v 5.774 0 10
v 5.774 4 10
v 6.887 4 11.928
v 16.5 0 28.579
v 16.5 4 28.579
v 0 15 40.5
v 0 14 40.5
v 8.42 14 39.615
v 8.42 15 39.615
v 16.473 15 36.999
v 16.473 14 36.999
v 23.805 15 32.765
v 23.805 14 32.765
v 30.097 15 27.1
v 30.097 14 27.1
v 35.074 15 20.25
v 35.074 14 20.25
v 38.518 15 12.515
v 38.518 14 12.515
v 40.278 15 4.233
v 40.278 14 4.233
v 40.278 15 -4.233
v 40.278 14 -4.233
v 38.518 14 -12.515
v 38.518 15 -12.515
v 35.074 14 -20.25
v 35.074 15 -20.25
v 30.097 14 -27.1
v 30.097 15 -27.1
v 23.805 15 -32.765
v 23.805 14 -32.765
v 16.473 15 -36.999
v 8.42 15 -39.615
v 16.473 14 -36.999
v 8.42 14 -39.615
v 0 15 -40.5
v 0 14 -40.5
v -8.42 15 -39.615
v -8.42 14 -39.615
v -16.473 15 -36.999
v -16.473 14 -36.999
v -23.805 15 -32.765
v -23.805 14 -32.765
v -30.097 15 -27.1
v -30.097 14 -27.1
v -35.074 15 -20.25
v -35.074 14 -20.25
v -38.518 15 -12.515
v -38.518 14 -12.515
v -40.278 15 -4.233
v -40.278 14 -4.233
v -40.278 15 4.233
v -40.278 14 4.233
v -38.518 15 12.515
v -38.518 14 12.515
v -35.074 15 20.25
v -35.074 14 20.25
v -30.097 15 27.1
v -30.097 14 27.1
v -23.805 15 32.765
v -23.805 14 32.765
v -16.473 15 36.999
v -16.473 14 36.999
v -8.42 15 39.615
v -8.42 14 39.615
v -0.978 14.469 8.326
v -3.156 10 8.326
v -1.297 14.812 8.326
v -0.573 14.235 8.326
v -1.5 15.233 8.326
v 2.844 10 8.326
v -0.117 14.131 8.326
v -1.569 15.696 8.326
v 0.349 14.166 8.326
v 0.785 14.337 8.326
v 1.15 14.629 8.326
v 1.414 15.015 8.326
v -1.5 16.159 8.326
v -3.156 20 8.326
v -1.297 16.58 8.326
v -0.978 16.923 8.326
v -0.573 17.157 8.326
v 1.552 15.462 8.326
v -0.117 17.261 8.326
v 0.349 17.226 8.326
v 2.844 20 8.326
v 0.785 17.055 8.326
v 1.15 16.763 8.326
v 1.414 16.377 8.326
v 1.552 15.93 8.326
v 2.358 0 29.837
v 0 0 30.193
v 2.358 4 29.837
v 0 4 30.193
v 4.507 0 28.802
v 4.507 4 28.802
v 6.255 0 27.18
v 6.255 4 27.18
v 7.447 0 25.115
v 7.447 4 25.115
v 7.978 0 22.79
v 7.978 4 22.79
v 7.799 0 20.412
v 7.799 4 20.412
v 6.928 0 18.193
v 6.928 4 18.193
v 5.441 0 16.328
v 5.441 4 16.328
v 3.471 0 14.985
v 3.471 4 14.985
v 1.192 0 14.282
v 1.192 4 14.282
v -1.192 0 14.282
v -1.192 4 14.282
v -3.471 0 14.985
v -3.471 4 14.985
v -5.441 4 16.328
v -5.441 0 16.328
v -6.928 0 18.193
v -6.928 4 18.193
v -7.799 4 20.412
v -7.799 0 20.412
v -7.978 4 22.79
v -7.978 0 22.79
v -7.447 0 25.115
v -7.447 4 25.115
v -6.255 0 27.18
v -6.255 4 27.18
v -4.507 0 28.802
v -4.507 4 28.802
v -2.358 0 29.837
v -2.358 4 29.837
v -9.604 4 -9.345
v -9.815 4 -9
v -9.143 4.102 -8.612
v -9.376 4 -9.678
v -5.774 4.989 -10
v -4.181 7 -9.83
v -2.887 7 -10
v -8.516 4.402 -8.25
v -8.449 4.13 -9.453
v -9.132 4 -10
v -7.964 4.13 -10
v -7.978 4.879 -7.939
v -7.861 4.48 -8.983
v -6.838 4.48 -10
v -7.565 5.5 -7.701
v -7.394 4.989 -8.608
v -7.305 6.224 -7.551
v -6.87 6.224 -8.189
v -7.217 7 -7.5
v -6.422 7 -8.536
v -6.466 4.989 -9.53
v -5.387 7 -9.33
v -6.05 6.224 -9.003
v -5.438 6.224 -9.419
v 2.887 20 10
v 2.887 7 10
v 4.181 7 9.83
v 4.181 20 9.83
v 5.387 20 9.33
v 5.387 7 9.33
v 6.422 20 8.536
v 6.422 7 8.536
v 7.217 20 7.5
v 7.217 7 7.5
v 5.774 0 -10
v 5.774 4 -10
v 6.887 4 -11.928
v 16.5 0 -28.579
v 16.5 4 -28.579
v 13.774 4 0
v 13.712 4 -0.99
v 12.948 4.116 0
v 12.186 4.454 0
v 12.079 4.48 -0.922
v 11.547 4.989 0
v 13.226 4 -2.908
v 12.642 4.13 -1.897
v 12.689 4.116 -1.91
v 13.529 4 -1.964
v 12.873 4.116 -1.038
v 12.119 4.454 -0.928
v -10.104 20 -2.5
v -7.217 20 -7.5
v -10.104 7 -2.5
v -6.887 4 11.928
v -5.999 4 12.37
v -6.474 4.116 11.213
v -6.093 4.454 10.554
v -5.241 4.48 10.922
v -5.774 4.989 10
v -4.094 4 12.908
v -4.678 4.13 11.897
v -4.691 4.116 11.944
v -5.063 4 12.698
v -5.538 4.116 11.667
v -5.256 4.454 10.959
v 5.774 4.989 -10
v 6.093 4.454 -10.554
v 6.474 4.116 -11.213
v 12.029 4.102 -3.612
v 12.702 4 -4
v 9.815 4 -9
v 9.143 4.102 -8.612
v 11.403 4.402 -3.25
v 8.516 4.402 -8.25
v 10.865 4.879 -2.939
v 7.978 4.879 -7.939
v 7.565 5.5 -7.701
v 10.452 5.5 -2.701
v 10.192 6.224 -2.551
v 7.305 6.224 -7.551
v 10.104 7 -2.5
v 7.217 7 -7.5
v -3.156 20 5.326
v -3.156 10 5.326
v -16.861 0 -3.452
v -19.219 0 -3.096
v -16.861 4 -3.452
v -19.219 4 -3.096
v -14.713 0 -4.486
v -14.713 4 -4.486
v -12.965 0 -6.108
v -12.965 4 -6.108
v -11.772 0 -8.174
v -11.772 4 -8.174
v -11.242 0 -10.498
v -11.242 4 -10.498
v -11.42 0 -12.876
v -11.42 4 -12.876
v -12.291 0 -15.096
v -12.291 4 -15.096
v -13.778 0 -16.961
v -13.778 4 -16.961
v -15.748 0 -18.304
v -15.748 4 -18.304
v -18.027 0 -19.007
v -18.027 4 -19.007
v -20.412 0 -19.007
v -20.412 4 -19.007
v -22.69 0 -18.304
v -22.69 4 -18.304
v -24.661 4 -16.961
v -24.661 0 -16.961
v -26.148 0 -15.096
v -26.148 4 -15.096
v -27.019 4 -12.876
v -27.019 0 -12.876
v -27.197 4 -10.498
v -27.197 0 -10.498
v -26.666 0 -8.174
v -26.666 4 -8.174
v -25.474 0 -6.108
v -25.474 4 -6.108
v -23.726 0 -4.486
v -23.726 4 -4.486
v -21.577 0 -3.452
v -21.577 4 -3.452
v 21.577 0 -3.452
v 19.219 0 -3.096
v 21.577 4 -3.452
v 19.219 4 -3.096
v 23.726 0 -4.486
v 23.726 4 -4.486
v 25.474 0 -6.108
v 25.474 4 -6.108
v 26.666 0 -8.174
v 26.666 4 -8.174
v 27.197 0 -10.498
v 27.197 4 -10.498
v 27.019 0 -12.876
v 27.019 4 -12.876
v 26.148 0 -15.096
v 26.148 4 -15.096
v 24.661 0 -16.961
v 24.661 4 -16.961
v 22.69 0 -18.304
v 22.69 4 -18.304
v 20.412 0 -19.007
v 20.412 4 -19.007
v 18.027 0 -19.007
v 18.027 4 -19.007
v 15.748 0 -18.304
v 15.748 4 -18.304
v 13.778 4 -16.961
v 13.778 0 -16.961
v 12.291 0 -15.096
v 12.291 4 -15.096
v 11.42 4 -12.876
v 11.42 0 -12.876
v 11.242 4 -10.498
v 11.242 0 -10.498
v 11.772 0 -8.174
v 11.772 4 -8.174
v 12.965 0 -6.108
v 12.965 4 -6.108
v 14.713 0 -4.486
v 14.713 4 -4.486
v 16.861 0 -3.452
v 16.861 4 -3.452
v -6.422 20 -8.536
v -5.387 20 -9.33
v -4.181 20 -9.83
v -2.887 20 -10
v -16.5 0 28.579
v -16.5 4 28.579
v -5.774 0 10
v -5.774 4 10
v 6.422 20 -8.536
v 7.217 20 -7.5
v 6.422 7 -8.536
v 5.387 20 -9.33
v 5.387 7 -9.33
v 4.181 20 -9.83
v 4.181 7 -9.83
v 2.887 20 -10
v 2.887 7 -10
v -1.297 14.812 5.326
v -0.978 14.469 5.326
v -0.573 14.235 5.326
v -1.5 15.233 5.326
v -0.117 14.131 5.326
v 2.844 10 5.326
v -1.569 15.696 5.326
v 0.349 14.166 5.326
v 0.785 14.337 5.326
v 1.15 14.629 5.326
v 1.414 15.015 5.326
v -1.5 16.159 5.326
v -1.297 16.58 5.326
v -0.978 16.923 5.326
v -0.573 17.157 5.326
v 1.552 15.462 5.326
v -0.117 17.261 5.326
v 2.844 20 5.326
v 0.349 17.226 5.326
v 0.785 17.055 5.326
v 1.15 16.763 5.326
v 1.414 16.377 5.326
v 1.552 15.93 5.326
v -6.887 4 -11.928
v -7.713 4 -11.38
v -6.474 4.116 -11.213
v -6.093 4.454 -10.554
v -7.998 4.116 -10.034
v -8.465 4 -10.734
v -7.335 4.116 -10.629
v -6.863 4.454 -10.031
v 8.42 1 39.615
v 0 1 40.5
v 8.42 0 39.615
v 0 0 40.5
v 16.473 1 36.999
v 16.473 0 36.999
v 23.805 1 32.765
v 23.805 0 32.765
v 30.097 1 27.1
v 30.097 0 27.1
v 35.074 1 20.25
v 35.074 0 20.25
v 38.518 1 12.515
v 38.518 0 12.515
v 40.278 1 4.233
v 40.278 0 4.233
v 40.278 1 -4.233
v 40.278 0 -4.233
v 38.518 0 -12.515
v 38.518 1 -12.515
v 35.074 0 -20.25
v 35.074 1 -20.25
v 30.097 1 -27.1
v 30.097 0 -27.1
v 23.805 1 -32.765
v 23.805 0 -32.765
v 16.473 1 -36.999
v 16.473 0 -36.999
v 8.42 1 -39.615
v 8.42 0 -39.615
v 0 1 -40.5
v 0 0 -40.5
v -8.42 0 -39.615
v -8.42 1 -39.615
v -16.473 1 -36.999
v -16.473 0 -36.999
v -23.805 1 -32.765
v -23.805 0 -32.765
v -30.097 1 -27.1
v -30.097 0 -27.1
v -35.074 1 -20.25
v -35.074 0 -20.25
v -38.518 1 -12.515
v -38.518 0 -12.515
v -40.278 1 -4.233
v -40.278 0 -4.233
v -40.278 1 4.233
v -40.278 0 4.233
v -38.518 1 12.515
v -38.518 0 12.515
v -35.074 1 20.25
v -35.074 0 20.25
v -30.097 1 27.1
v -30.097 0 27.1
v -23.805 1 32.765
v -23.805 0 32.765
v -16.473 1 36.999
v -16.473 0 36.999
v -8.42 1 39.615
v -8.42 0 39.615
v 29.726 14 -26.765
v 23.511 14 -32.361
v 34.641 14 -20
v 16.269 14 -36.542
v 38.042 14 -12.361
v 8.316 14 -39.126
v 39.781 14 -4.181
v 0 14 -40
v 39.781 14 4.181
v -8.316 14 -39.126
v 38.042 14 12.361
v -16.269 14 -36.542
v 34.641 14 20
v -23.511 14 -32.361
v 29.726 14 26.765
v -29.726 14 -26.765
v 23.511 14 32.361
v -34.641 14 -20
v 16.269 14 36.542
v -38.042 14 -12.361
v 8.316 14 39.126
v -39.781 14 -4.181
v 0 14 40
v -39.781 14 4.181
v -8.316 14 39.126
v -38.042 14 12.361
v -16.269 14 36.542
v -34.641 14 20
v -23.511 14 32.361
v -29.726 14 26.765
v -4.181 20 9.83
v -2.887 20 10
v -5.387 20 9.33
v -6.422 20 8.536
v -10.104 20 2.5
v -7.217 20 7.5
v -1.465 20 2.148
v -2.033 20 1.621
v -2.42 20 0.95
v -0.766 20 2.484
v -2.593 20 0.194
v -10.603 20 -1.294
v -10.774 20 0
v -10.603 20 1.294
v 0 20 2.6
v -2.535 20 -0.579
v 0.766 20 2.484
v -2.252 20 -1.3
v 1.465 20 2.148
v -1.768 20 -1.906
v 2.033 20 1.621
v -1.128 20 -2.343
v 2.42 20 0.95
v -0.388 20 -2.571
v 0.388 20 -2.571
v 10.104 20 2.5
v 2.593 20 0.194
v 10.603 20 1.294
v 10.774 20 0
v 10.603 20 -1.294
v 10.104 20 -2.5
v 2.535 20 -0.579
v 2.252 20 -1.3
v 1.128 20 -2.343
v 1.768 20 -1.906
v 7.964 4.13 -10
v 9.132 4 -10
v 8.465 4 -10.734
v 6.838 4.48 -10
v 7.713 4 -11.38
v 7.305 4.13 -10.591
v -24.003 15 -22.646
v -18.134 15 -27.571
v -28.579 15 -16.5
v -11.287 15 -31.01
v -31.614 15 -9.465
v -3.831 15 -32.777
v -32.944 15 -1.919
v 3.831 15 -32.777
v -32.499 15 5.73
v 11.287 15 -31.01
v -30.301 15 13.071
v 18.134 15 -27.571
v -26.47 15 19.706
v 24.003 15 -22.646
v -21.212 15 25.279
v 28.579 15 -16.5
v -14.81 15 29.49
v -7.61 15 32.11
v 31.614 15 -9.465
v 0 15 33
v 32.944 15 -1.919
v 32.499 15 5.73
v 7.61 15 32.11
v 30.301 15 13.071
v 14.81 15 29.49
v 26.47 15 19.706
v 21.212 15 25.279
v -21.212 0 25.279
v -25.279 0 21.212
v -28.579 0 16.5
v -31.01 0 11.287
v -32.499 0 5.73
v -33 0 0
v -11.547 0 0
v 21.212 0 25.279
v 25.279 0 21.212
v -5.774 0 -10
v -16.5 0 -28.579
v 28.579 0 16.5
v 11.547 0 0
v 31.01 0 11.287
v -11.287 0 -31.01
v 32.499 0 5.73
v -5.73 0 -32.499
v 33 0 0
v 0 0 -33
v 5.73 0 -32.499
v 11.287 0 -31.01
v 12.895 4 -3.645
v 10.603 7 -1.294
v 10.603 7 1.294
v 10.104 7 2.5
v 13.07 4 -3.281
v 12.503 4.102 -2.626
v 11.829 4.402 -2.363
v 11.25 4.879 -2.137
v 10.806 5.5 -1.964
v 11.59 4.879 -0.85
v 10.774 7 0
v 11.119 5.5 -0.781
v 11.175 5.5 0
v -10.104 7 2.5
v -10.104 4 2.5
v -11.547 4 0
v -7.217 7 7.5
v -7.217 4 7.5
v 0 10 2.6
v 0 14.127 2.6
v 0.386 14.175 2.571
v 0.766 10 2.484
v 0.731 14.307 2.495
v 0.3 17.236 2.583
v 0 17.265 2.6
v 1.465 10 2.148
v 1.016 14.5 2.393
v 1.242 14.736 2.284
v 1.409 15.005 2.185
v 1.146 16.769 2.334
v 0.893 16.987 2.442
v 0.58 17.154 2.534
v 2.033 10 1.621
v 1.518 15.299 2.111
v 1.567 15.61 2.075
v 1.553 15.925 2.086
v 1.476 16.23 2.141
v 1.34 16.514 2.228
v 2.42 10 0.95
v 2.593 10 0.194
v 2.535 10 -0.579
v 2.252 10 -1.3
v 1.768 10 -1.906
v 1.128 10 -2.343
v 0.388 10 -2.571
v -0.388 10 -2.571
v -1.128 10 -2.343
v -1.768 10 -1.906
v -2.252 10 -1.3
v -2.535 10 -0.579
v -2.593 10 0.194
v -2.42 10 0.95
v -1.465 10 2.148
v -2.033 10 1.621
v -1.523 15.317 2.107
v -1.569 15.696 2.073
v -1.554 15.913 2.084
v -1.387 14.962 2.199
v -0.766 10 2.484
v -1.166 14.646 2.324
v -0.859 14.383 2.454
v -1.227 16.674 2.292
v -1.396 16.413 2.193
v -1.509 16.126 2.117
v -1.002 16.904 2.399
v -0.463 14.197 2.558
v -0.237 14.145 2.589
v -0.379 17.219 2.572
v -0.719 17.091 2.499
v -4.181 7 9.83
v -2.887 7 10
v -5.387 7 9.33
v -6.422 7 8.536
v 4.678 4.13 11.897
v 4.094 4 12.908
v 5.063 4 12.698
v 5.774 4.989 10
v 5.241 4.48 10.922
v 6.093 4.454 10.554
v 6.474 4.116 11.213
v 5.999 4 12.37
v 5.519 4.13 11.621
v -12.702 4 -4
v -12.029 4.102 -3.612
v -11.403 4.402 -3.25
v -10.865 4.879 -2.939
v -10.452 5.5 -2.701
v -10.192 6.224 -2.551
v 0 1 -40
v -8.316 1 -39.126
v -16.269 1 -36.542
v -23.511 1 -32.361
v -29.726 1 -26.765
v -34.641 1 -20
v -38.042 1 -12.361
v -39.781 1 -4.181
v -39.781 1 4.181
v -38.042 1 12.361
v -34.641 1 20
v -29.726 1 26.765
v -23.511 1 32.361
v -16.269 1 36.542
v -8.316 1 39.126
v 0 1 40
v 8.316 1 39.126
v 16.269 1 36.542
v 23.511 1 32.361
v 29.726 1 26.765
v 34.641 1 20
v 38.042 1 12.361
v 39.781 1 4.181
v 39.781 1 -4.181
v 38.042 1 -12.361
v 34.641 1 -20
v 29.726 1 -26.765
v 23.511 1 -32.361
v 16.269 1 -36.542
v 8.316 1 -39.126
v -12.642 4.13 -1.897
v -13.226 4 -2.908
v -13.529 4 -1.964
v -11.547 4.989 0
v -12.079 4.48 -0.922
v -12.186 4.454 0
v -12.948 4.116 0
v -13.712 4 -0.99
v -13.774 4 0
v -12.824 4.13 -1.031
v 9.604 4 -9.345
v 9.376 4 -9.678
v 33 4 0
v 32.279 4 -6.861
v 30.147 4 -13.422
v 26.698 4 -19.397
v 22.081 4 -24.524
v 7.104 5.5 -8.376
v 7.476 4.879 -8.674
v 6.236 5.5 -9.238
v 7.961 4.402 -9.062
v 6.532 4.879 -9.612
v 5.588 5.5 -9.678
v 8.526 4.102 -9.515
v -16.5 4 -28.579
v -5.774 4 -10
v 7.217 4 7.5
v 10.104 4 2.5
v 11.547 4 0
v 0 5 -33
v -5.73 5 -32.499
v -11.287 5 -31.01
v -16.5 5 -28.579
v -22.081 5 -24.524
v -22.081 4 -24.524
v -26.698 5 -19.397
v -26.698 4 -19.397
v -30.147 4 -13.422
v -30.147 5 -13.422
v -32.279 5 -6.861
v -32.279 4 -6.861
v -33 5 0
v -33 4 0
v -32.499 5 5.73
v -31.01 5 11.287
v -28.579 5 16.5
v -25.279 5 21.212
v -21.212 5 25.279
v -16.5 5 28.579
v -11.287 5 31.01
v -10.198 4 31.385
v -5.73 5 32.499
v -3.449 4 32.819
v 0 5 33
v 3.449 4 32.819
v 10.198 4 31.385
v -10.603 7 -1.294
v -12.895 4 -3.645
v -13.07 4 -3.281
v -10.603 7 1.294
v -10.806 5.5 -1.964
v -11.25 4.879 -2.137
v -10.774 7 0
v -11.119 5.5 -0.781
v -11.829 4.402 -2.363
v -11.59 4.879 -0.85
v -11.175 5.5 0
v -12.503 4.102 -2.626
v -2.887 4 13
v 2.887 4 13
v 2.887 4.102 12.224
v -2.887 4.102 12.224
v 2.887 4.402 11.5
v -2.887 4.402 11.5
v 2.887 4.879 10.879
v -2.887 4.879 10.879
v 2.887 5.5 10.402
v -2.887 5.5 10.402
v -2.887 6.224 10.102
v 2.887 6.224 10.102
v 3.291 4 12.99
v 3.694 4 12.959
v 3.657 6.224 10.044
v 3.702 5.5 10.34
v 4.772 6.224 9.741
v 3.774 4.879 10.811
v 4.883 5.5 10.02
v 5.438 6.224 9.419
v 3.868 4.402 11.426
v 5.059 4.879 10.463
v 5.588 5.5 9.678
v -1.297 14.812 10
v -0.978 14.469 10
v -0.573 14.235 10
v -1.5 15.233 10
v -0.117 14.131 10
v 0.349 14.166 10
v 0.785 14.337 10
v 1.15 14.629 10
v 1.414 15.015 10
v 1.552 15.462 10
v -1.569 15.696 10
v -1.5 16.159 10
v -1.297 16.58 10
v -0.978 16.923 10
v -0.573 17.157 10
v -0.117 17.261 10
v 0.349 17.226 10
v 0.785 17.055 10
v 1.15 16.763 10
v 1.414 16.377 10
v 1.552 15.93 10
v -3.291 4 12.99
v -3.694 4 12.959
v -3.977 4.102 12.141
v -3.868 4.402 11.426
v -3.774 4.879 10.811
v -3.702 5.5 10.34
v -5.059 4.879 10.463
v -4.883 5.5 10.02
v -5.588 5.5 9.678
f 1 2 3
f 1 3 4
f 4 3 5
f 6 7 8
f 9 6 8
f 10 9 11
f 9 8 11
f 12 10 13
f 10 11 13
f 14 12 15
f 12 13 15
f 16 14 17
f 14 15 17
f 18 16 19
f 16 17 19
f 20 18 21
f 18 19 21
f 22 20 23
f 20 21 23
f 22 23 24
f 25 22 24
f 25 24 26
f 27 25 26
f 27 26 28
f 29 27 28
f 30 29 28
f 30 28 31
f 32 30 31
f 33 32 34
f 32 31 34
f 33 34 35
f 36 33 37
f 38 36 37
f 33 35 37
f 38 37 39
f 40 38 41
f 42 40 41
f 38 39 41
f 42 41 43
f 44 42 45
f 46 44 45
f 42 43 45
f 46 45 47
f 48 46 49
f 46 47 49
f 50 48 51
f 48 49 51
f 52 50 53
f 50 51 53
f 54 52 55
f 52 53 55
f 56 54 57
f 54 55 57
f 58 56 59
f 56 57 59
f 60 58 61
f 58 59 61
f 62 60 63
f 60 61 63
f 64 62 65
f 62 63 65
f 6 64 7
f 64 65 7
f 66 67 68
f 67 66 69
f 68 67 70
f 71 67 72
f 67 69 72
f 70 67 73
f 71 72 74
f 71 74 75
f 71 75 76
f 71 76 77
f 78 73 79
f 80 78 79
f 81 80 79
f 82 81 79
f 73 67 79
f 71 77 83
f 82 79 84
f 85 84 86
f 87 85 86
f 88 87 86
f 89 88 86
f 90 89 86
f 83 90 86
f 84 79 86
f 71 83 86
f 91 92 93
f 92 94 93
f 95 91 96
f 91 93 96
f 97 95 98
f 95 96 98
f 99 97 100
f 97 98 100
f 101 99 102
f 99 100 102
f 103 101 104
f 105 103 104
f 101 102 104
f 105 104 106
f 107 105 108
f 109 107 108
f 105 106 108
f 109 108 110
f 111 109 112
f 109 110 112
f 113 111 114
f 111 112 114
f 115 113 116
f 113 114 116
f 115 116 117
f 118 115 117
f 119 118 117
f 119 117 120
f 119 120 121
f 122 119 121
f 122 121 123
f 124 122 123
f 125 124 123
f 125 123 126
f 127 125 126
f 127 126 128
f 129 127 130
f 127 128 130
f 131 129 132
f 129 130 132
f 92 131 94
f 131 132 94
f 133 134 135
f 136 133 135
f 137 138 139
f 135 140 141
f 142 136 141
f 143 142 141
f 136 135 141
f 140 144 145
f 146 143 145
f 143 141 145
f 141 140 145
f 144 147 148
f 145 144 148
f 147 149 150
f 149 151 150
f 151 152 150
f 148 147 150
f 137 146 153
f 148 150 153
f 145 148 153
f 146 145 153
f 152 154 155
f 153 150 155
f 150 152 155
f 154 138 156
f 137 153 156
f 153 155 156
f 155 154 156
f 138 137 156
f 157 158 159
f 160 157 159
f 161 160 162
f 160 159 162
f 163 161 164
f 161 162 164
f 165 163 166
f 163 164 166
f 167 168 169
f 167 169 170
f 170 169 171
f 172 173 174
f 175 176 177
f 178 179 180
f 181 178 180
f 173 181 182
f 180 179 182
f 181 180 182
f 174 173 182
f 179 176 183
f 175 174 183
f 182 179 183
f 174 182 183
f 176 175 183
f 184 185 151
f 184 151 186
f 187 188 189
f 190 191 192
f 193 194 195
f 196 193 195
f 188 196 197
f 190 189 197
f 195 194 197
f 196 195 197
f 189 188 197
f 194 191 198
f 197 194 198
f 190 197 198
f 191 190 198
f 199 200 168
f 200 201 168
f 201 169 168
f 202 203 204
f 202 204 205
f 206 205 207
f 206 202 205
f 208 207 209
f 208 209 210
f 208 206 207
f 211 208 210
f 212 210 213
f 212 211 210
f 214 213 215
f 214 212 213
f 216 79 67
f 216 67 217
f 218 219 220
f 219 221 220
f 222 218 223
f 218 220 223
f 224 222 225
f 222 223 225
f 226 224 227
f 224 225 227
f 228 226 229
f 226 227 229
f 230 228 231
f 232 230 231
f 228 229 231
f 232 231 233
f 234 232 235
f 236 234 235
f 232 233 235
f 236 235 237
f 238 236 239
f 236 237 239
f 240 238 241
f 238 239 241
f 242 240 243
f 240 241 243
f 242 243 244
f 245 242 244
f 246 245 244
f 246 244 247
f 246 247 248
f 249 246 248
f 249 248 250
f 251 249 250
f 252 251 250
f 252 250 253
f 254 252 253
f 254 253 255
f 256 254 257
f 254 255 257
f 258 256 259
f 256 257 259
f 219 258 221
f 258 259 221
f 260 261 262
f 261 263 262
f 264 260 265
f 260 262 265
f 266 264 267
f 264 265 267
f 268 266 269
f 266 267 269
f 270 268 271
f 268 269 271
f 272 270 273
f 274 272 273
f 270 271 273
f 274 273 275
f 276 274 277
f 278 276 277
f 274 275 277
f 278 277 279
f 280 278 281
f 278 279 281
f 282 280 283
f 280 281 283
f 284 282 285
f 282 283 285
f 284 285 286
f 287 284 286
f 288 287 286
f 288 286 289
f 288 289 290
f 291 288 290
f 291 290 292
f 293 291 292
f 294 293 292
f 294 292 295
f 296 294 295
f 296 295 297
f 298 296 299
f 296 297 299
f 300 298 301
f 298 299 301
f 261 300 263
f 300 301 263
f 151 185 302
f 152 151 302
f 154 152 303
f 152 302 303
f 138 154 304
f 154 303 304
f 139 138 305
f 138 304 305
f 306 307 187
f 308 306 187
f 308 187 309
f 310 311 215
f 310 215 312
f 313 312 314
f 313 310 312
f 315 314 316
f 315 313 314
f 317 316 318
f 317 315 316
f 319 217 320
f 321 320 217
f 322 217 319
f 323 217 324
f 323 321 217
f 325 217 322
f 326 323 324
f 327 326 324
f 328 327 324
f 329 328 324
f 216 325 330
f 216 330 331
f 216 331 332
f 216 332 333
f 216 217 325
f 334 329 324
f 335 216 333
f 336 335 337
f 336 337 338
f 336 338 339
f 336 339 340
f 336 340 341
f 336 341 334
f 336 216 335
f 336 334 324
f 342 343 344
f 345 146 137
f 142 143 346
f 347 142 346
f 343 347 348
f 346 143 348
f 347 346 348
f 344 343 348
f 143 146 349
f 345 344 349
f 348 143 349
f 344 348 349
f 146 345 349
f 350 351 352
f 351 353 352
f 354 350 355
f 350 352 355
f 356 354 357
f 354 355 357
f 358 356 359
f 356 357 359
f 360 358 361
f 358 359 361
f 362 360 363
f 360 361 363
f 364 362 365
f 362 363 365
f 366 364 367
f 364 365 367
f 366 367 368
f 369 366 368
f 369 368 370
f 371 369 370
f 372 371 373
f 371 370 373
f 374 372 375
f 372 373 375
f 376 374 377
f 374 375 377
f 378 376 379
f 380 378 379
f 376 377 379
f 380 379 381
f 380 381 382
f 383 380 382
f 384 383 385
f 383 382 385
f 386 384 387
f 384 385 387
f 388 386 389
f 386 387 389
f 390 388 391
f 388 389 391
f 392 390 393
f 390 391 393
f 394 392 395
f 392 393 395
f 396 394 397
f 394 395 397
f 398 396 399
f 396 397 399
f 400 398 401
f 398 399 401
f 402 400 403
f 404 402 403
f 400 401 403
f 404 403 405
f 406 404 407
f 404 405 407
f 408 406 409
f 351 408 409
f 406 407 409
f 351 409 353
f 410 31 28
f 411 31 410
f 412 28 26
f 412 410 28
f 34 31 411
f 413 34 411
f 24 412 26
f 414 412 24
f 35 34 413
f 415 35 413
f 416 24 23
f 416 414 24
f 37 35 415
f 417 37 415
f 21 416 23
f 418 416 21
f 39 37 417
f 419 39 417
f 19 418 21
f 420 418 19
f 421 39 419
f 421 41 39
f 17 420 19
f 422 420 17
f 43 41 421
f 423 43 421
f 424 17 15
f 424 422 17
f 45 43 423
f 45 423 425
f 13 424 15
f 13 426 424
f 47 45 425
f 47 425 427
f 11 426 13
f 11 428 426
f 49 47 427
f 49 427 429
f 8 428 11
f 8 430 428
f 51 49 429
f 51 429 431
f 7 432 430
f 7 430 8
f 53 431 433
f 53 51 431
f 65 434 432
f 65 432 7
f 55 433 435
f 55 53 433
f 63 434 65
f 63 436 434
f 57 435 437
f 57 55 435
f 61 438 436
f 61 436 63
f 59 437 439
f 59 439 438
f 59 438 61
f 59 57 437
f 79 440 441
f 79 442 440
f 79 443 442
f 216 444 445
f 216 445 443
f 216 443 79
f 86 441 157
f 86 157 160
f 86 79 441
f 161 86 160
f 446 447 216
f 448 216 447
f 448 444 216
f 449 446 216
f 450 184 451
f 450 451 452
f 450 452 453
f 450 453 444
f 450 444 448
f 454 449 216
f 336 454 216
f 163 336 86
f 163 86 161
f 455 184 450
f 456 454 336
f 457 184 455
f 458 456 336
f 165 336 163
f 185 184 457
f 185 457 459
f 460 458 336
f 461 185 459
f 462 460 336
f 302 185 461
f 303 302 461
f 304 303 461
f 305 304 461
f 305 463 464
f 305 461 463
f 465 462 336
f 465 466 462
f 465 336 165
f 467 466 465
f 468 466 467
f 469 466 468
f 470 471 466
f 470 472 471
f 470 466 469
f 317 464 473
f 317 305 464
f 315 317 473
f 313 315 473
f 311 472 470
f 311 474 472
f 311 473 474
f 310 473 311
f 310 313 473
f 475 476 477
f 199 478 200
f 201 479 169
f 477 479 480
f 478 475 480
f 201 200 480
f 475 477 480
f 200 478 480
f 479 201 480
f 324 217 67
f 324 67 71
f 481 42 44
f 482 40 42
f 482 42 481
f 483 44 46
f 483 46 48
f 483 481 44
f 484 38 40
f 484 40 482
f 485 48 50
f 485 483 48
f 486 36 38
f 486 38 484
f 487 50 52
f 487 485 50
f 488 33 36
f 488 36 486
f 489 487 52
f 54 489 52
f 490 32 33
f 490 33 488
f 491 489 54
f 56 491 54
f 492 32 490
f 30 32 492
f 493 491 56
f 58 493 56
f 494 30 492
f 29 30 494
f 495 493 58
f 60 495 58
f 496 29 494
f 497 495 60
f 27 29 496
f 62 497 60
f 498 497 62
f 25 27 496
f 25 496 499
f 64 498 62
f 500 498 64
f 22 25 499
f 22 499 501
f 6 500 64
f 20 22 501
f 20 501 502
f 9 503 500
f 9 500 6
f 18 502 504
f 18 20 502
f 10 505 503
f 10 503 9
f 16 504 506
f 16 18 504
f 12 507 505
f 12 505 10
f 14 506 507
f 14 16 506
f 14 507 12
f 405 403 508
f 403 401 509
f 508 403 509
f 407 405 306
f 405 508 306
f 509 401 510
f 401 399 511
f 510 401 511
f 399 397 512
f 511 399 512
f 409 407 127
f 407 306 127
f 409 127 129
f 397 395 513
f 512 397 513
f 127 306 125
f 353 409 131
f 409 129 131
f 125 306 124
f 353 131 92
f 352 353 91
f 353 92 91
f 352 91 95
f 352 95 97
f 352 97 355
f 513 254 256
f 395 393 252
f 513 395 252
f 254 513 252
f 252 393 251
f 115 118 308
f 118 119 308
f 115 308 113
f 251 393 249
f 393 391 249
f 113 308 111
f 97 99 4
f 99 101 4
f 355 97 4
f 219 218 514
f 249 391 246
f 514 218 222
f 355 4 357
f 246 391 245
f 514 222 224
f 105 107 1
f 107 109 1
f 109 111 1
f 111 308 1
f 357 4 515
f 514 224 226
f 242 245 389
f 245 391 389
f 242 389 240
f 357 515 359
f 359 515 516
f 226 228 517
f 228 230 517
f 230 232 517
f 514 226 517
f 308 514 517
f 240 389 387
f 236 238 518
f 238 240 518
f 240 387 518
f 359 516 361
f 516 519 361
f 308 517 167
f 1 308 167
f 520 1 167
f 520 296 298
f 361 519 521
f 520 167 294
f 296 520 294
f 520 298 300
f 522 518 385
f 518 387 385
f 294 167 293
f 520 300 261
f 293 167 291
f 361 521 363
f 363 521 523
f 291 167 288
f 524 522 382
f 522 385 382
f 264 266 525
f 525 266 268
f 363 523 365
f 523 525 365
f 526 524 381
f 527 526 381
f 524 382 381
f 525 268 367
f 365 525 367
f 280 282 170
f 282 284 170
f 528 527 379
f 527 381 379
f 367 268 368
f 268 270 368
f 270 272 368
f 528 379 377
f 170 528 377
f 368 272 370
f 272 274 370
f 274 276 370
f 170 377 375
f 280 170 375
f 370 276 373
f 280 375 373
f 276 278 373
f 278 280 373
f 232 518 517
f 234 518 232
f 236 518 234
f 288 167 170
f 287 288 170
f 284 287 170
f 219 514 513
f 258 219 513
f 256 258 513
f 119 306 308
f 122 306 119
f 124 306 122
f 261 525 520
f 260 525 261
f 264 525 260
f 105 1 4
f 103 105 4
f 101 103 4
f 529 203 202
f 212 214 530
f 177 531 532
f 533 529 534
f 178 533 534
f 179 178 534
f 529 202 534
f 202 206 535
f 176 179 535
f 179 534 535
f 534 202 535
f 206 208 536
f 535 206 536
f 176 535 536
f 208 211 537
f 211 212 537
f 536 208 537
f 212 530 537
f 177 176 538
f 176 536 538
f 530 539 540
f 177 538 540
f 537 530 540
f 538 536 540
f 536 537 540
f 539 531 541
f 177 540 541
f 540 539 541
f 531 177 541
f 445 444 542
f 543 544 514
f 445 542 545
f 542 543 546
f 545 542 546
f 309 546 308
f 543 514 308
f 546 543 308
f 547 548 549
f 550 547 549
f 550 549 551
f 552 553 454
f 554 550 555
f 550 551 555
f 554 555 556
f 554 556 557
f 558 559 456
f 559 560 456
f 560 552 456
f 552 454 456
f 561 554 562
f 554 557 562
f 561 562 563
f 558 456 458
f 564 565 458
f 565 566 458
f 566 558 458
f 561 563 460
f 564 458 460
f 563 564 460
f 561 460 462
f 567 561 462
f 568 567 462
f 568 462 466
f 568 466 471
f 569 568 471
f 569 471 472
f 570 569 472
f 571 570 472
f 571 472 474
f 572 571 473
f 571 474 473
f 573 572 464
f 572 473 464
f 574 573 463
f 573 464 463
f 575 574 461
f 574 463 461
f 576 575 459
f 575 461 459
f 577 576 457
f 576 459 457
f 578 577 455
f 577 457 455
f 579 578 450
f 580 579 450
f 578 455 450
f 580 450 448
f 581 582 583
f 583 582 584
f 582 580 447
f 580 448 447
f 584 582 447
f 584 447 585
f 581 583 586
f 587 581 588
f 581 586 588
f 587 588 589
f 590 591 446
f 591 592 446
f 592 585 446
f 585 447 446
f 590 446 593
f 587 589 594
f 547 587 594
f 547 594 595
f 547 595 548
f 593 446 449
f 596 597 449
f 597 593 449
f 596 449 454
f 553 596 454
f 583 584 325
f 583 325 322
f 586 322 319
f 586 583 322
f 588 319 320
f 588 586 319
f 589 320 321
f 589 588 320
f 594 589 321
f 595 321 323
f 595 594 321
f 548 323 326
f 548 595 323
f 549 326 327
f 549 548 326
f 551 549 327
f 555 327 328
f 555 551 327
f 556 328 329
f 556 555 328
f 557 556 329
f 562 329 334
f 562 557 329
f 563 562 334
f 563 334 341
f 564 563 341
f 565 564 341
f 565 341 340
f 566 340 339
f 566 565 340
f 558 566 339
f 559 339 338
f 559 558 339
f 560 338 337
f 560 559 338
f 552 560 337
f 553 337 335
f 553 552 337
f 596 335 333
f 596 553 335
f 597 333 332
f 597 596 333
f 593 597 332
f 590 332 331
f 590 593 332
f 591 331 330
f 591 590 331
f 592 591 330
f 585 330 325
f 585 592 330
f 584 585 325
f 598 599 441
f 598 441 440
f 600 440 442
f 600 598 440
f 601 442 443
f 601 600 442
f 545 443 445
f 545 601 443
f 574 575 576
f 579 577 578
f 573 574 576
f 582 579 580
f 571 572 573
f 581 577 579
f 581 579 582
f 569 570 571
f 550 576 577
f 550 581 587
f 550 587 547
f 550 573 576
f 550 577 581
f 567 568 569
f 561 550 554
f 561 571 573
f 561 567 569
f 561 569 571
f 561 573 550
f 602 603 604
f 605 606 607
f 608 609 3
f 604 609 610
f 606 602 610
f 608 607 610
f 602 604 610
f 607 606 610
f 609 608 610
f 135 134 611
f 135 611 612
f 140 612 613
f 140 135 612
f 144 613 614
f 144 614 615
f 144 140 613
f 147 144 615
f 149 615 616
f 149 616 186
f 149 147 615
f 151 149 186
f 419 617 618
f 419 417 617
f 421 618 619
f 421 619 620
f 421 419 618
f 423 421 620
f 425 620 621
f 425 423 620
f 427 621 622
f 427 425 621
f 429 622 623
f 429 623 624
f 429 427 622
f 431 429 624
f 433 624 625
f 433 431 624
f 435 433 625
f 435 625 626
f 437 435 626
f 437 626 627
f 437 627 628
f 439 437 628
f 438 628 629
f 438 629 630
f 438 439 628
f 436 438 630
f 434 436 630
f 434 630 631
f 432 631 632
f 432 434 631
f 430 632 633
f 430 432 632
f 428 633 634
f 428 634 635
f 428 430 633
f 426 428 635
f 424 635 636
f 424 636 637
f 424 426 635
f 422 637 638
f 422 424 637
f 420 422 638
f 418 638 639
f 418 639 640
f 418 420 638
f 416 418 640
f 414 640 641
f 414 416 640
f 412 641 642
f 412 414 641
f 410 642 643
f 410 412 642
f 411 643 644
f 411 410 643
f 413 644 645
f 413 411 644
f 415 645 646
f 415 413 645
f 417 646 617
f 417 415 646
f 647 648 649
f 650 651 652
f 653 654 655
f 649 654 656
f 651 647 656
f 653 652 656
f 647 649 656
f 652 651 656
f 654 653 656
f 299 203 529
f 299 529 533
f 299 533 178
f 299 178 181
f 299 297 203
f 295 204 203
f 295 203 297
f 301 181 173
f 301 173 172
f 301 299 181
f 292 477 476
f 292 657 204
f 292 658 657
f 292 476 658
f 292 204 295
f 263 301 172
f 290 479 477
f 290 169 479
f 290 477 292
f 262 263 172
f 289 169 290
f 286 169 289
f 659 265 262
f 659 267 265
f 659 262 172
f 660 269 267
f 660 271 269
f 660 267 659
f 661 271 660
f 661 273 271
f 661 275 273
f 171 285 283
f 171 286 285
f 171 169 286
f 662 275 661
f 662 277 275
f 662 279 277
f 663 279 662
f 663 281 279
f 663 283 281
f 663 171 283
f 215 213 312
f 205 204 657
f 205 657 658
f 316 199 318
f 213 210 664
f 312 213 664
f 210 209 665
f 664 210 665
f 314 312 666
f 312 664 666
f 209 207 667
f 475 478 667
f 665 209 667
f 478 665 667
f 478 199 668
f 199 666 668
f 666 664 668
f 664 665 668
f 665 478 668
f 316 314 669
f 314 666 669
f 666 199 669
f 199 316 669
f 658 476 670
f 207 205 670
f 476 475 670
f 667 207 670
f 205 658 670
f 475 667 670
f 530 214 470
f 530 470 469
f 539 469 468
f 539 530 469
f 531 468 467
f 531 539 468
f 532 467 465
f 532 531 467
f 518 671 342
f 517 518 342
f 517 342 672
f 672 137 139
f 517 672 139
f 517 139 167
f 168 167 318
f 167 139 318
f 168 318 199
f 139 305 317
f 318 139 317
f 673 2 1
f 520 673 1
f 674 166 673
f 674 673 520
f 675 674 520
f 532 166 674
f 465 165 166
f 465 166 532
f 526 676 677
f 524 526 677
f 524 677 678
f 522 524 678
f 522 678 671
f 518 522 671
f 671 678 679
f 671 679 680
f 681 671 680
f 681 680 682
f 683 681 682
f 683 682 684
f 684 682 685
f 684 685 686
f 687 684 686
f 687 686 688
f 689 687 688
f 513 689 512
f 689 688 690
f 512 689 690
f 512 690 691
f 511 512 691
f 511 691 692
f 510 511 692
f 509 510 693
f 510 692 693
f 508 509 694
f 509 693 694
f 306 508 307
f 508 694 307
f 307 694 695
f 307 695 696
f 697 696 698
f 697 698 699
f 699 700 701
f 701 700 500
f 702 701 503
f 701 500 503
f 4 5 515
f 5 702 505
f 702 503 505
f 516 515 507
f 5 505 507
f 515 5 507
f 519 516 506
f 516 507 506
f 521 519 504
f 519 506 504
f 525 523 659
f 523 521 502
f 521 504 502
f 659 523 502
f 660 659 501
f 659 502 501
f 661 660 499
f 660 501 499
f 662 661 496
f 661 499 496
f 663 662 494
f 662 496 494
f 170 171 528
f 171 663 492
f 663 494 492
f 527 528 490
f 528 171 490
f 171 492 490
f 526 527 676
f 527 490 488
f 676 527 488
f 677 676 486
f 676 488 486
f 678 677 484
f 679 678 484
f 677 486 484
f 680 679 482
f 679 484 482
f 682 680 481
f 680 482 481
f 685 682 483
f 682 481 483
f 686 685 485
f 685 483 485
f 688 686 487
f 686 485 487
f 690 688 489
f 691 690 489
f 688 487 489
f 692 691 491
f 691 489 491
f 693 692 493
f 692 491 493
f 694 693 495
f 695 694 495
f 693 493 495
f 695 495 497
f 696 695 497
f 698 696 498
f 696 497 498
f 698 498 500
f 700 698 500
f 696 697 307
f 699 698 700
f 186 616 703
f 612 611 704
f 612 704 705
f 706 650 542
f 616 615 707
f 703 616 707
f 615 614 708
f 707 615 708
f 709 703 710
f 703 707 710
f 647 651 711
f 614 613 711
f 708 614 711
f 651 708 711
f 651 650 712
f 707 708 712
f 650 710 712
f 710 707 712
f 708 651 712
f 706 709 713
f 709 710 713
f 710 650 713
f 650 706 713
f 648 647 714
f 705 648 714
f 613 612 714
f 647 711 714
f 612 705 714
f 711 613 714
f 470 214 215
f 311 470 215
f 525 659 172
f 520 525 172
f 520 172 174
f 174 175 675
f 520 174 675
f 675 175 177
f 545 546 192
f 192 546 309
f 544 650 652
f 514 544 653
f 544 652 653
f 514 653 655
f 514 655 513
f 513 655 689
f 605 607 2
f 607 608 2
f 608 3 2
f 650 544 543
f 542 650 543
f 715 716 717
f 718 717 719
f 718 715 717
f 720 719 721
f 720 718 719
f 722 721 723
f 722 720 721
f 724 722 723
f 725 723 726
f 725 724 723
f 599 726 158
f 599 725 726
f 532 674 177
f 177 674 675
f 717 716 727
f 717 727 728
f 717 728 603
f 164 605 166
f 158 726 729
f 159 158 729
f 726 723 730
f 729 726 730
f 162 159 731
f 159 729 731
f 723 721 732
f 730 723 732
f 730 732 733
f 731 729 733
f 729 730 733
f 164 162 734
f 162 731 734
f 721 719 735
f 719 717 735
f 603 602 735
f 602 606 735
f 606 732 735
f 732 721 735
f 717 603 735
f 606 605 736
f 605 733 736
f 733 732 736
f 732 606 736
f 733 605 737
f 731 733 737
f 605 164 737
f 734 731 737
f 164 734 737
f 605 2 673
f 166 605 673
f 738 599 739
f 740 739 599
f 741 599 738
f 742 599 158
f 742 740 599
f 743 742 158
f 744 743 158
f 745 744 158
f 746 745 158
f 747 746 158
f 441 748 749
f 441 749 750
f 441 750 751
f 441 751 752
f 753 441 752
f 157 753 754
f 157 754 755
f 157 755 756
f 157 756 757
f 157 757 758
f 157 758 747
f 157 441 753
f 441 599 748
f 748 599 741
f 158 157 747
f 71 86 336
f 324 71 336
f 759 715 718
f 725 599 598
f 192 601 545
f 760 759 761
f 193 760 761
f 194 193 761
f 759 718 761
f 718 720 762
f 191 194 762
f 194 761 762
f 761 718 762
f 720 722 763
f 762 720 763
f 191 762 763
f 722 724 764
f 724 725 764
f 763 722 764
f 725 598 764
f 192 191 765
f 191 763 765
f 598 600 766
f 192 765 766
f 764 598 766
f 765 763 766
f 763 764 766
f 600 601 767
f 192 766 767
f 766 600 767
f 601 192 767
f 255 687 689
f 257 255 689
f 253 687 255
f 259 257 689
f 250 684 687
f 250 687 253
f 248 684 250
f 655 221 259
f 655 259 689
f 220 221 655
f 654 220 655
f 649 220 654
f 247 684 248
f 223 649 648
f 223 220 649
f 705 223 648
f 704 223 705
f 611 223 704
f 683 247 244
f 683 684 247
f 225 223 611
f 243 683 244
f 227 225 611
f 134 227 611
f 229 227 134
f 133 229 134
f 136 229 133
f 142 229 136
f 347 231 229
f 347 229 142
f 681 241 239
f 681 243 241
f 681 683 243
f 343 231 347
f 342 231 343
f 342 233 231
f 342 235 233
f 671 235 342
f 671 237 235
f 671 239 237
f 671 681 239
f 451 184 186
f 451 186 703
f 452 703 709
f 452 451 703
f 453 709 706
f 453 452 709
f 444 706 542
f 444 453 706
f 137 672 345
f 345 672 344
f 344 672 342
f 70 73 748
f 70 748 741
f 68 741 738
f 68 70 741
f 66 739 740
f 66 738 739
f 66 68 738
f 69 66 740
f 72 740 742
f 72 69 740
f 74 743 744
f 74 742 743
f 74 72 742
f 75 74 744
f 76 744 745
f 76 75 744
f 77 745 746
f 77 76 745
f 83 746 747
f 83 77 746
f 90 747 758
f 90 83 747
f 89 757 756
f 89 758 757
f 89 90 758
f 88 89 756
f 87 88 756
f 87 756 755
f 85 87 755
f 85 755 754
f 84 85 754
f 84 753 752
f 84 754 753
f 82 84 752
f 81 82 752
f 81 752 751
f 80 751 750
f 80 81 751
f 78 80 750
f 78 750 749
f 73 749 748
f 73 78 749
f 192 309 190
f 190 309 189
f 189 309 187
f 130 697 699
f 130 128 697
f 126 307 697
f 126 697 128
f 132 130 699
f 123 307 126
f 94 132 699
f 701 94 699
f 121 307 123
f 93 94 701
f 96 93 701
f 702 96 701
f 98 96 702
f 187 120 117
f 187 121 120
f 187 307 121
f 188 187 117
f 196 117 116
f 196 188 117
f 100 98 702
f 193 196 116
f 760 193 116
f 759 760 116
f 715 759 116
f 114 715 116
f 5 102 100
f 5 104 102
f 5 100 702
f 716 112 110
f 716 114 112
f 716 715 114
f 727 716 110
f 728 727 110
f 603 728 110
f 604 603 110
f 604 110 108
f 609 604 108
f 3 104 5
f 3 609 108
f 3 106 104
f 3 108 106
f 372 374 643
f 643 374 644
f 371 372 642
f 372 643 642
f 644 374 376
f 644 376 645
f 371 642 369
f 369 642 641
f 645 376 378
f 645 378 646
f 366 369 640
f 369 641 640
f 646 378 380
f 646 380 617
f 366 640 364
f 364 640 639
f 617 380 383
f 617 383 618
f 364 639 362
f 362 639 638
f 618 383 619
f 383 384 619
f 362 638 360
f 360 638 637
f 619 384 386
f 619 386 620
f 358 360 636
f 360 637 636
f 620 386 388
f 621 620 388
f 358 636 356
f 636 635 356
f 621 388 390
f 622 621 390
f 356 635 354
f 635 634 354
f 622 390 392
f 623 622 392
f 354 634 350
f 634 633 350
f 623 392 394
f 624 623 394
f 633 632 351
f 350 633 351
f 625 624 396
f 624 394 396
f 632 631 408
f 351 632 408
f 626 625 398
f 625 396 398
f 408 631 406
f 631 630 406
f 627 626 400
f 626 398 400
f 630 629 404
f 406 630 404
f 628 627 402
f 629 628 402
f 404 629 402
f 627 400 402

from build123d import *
from build123d.topology import SkipClean

# Parameters (mm, degrees)
SKETCH1_R                = 40.5
BOSS_EXTRUDE16_DEPTH     = 5
SKETCH1_23_R             = 5
BOSS_EXTRUDE17_DEPTH     = 5
CUT_EXTRUDE6_DEPTH       = 15
CUT_EXTRUDE7_DEPTH       = 5
CUT_EXTRUDE8_DEPTH       = 5
CUT_EXTRUDE9_DEPTH       = 5
BOSS_EXTRUDE19_DEPTH     = 5
CUT_EXTRUDE14_DEPTH      = 1
SKETCH24_R               = 8
CUT_EXTRUDE15_DEPTH      = 4
SKETCH24_2_R             = 8
CUT_EXTRUDE16_DEPTH      = 6
BOSS_EXTRUDE21_START     = -1
SKETCH30_R               = 40
SKETCH30_R_2             = 33
BOSS_EXTRUDE21_DEPTH     = 1
BOSS_EXTRUDE22_DEPTH     = 15
SKETCH33_R               = 2.6
CUT_EXTRUDE17_DEPTH      = 10
SKETCH35_W               = 6
SKETCH35_H               = 3
CUT_EXTRUDE18_DEPTH      = 10
CUT_EXTRUDE19_DEPTH      = 17
CUT_EXTRUDE19_DEPTH_BACK = 5
SKETCH36_R               = 1.569356798
SKETCH37_R               = 40.5
SKETCH37_R_2             = 33
BOSS_EXTRUDE23_DEPTH     = 10
SKETCH39_W               = 0.5
SKETCH39_H               = 13
BOSS_EXTRUDE25_DEPTH     = 5
FILLET2_R                = 5
FILLET3_R                = 3


with BuildPart() as part:
    # Sketch1 → Boss-Extrude16 (new body)
    with BuildSketch(Plane(origin=(0, 0, 0), x_dir=(1, 0, 0), z_dir=(0, 1, 0))):
        with Locations(Location((0, 0, 0), (0, 0, 270))):
            Circle(SKETCH1_R)
    extrude(amount=BOSS_EXTRUDE16_DEPTH)

    # Sketch1<23> → Boss-Extrude17 (add)
    with BuildSketch(Plane(origin=(0, 0, 0), x_dir=(1, 0, 0), z_dir=(0, 1, 0))):
        Circle(SKETCH1_23_R)
    extrude(amount=BOSS_EXTRUDE17_DEPTH)

    # Sketch1<29> → Cut-Extrude6 (cut)
    with BuildSketch(Plane(origin=(0, 0, 0), x_dir=(1, 0, 0), z_dir=(0, 1, 0))):
        with BuildLine():
            ThreePointArc((1.209994132, 1.5924554), (0.148641183, -1.994468801), (-1.43267703, 1.395505833))
            Line((-1.43267703, 1.395505833), (1.209994132, 1.5924554))
        make_face()
    extrude(amount=CUT_EXTRUDE6_DEPTH, mode=Mode.SUBTRACT)

    # Sketch13 → Cut-Extrude7 (cut)
    with BuildSketch(Plane(origin=(0, 5, 0), x_dir=(1, 0, 0), z_dir=(0, 1, 0))):
        with BuildLine():
            Line((-16.5, 28.578838325), (-3.827980833, 6.630257293))
            Line((-3.827980833, 6.630257293), (-3e-09, 6.630257293))
            Line((-3e-09, 6.630257293), (3.827980833, 6.630257293))
            Line((3.827980833, 6.630257293), (16.5, 28.578838325))
            ThreePointArc((16.5, 28.578838325), (8.541028451, 31.875552278), (-7.8e-08, 33))
            ThreePointArc((-7.8e-08, 33), (-8.541028526, 31.875552257), (-16.5, 28.578838325))
        make_face()
    extrude(amount=-CUT_EXTRUDE7_DEPTH, mode=Mode.SUBTRACT)

    # Sketch13<4> → Cut-Extrude8 (cut)
    with BuildSketch(Plane(origin=(0, 5, 0), x_dir=(1, 0, 0), z_dir=(0, 1, 0))):
        with BuildLine():
            Line((-5.741971189, -3.315128752), (-7.655961666, 0))
            Line((-7.655961666, 0), (-33, 0))
            ThreePointArc((-33, 0), (-31.875552302, -8.541028358), (-28.578838459, -16.499999767))
            ThreePointArc((-28.578838459, -16.499999767), (-23.334523874, -23.334523684), (-16.5, -28.578838325))
            Line((-16.5, -28.578838325), (-3.827980833, -6.630257293))
            Line((-3.827980833, -6.630257293), (-5.741971189, -3.315128752))
        make_face()
    extrude(amount=-CUT_EXTRUDE8_DEPTH, mode=Mode.SUBTRACT)

    # Sketch13<5> → Cut-Extrude9 (cut)
    with BuildSketch(Plane(origin=(0, 5, 0), x_dir=(1, 0, 0), z_dir=(0, 1, 0))):
        with BuildLine():
            Line((33, 0), (7.655961666, 0))
            Line((7.655961666, 0), (5.741971178, -3.31512877))
            Line((5.741971178, -3.31512877), (3.827980833, -6.630257293))
            Line((3.827980833, -6.630257293), (16.5, -28.578838325))
            ThreePointArc((16.5, -28.578838325), (23.334523686, -23.334523872), (28.578838193, -16.500000228))
            ThreePointArc((28.578838193, -16.500000228), (31.875552233, -8.541028616), (33, 0))
        make_face()
    extrude(amount=-CUT_EXTRUDE9_DEPTH, mode=Mode.SUBTRACT)

    # Sketch1<32> → Boss-Extrude19 (add)
    with BuildSketch(Plane(origin=(0, 0, 0), x_dir=(1, 0, 0), z_dir=(0, 1, 0))):
        with BuildLine():
            ThreePointArc((1.209994132, 1.5924554), (0.148641183, -1.994468801), (-1.43267703, 1.395505833))
            Line((-1.43267703, 1.395505833), (1.209994132, 1.5924554))
        make_face()
    extrude(amount=BOSS_EXTRUDE19_DEPTH)

    # Sketch13<11> → Cut-Extrude14 (cut)
    with BuildSketch(Plane(origin=(0, 5, 0), x_dir=(1, 0, 0), z_dir=(0, 1, 0))):
        with BuildLine():
            Line((-7.655961666, 0), (-3.827980833, 6.630257293))
            Line((-3.827980833, 6.630257293), (-16.5, 28.578838325))
            ThreePointArc((-16.5, 28.578838325), (-28.578838325, 16.5), (-33, 0))
            Line((-33, 0), (-7.655961666, 0))
        make_face()
        with BuildLine():
            Line((16.5, 28.578838325), (3.827980833, 6.630257293))
            Line((3.827980833, 6.630257293), (7.655961666, 0))
            Line((7.655961666, 0), (33, 0))
            ThreePointArc((33, 0), (28.578838325, 16.5), (16.5, 28.578838325))
        make_face()
        with BuildLine():
            Line((3.827980833, -6.630257293), (-3.827980833, -6.630257293))
            Line((-3.827980833, -6.630257293), (-16.5, -28.578838325))
            ThreePointArc((-16.5, -28.578838325), (0, -33), (16.5, -28.578838325))
            Line((16.5, -28.578838325), (3.827980833, -6.630257293))
        make_face()
    extrude(amount=-CUT_EXTRUDE14_DEPTH, mode=Mode.SUBTRACT)

    # Sketch24 → Cut-Extrude15 (cut)
    with BuildSketch(Plane(origin=(0, 5, 0), x_dir=(1, 0, 0), z_dir=(0, 1, 0))):
        with Locations(Location((0, -22.192555868, 0), (0, 0, 270))):
            Circle(SKETCH24_R)
        with Locations(Location((19.219317157, 11.096277934, 0), (0, 0, 270))):
            Circle(SKETCH24_R)
        with Locations(Location((-19.219317157, 11.096277934, 0), (0, 0, 270))):
            Circle(SKETCH24_R)
    extrude(amount=-CUT_EXTRUDE15_DEPTH, mode=Mode.SUBTRACT)

    # Sketch24<2> → Cut-Extrude16 (cut)
    with BuildSketch(Plane(origin=(0, 5, 0), x_dir=(1, 0, 0), z_dir=(0, 1, 0))):
        with Locations(Location((0, -22.192555868, 0), (0, 0, 270))):
            Circle(SKETCH24_2_R)
        with Locations(Location((19.219317157, 11.096277934, 0), (0, 0, 270))):
            Circle(SKETCH24_2_R)
        with Locations(Location((-19.219317157, 11.096277934, 0), (0, 0, 270))):
            Circle(SKETCH24_2_R)
    extrude(amount=-CUT_EXTRUDE16_DEPTH, mode=Mode.SUBTRACT)

    # Sketch30 → Boss-Extrude21 (add)
    with BuildSketch(Plane.XZ.offset(BOSS_EXTRUDE21_START)):
        Circle(SKETCH30_R)
        with Locations(Location((0, 0, 0), (0, 0, 90))):
            Circle(SKETCH30_R_2, mode=Mode.SUBTRACT)
    extrude(amount=BOSS_EXTRUDE21_DEPTH)

    # Sketch31 → Boss-Extrude22 (add)
    with BuildSketch(Plane(origin=(0, 5, 0), x_dir=(1, 0, 0), z_dir=(0, 1, 0))):
        Polygon((11.547005384, 0), (5.773502692, 10), (-5.773502692, 10), (-11.547005384, 0), (-5.773502692, -10), (5.773502692, -10), align=None)
    extrude(amount=BOSS_EXTRUDE22_DEPTH)

    # Sketch33 → Cut-Extrude17 (cut)
    with BuildSketch(Plane(origin=(0, 20, 0), x_dir=(1, 0, 0), z_dir=(0, 1, 0))):
        with Locations(Location((0, 0, 0), (0, 0, 270))):
            Circle(SKETCH33_R)
    extrude(amount=-CUT_EXTRUDE17_DEPTH, mode=Mode.SUBTRACT)

    # Sketch35 → Cut-Extrude18 (cut)
    with BuildSketch(Plane(origin=(0, 20, 0), x_dir=(1, 0, 0), z_dir=(0, 1, 0))):
        with Locations((-0.156352746, -6.826345259)):
            Rectangle(SKETCH35_W, SKETCH35_H)
    extrude(amount=-CUT_EXTRUDE18_DEPTH, mode=Mode.SUBTRACT)

    # Sketch36 → Cut-Extrude19 (cut, two sides: drawn at the far end of the back side and taken through both)
    with BuildSketch(Plane.XY.offset(5.326345259).offset(-CUT_EXTRUDE19_DEPTH_BACK)):
        with Locations(Location((0, 15.69600898, 0), (0, 0, 180))):
            Circle(SKETCH36_R)
    extrude(amount=CUT_EXTRUDE19_DEPTH + CUT_EXTRUDE19_DEPTH_BACK, mode=Mode.SUBTRACT)

    # Sketch37 → Boss-Extrude23 (add)
    with SkipClean():  # the faces are left unmerged after this step: merging them gives an invalid solid
        with BuildSketch(Plane(origin=(0, 5, 0), x_dir=(1, 0, 0), z_dir=(0, 1, 0))):
            with Locations(Location((0, 0, 0), (0, 0, 270))):
                Circle(SKETCH37_R)
            with Locations(Location((0, 0, 0), (0, 0, 270))):
                Circle(SKETCH37_R_2, mode=Mode.SUBTRACT)
        extrude(amount=BOSS_EXTRUDE23_DEPTH)
    add(part.part.scale(1), mode=Mode.REPLACE)  # the faces are merged on a copy

    # Sketch39 → Cut-Revolve1 (revolve, cut)
    with BuildSketch(Plane.XY, mode=Mode.PRIVATE) as cut_revolve1_sk:
        with Locations((40.25, 7.5)):
            Rectangle(SKETCH39_W, SKETCH39_H)
    revolve(cut_revolve1_sk.sketch.rotate(Axis((0, 0, 0), (0, 1, 0)), 90), axis=Axis((0, 0, 0), (0, 1, 0)), mode=Mode.SUBTRACT)

    # Sketch31<3> → Boss-Extrude25 (add)
    with BuildSketch(Plane(origin=(0, 5, 0), x_dir=(1, 0, 0), z_dir=(0, 1, 0))):
        Polygon((11.547005384, 0), (5.773502692, 10), (-5.773502692, 10), (-11.547005384, 0), (-5.773502692, -10), (5.773502692, -10), align=None)
    extrude(amount=-BOSS_EXTRUDE25_DEPTH)

    # Fillet2
    fillet2_edges = [part.edges().sort_by_distance(p)[0] for p in [
        (5.773502692, 12, 10),
        (11.547005384, 12, 0),
        (5.773502692, 12, -10),
        (-5.773502692, 12, -10),
        (-11.547005384, 12, 0),
        (-5.773502692, 12, 10),
    ]]
    fillet(fillet2_edges, radius=FILLET2_R)

    # Fillet3
    # the kernel refuses this fillet: 3 mm, written as the material it adds along each edge
    with BuildSketch(Plane(origin=(2.886751346, 4, 5), x_dir=(0, 0, 1), z_dir=(-1, 0, 0))) as fillet3_piece_1_section:
        with BuildLine():
            CenterArc((5 + FILLET3_R, FILLET3_R), FILLET3_R, 180, 90)
            Line((5 + FILLET3_R, 0), (5, 0))
            Line((5, 0), (5, FILLET3_R))
        make_face()
    fillet3_piece_1 = revolve(axis=Axis((2.886751346, 4, 5), (0, 1, 0)), revolution_arc=145.959010994, mode=Mode.PRIVATE)
    fillet3_piece_1 = split(fillet3_piece_1, bisect_by=Plane(origin=(5.63089288, 5.027584856, 10.247007441), z_dir=(-0.8660254037844389, 0, -0.4999999999999996)), keep=Keep.TOP, mode=Mode.PRIVATE)
    add(fillet3_piece_1)
    with BuildSketch(Plane(origin=(2.886751346, 4, 5), x_dir=(0, 0, 1), z_dir=(-1, 0, 0))) as fillet3_piece_2_section:
        with BuildLine():
            CenterArc((5 + FILLET3_R, FILLET3_R), FILLET3_R, 180, 90)
            Line((5 + FILLET3_R, 0), (5, 0))
            Line((5, 0), (5, FILLET3_R))
        make_face()
    fillet3_piece_2 = revolve(axis=Axis((2.886751346, 4, 5), (0, 1, 0)), revolution_arc=145.959010994, mode=Mode.PRIVATE)
    fillet3_piece_2 = split(fillet3_piece_2, bisect_by=Plane(origin=(6.175606905, 4.190788344, 10.696464926), z_dir=(-0.8660254037844383, 0, 0.5000000000000007)), keep=Keep.TOP, mode=Mode.PRIVATE)
    add(fillet3_piece_2)
    with BuildSketch(Plane(origin=(-2.886751346, 4, 10), x_dir=(0, 1, 0), z_dir=(1, 0, 0)), Plane(origin=(-7.216878365, 4, -7.5), x_dir=(0, 1, 0), z_dir=(-0.49999999999999983, 0, 0.8660254037844388)), Plane(origin=(10.103629711, 4, -2.5), x_dir=(0, 1, 0), z_dir=(-0.5, 0, -0.8660254037844387))) as fillet3_piece_3:
        with BuildLine():
            CenterArc((FILLET3_R, FILLET3_R), FILLET3_R, 180, 90)
            Line((0, FILLET3_R), (0, 0))
            Line((0, 0), (FILLET3_R, 0))
        make_face()
    extrude(amount=5.773502692)
    with BuildSketch(Plane(origin=(-2.886751346, 4, 5), x_dir=(0, 0, 1), z_dir=(1, 0, 0))) as fillet3_piece_4_section:
        with BuildLine():
            CenterArc((5 + FILLET3_R, -FILLET3_R), FILLET3_R, 90, 90)
            Line((5 + FILLET3_R, 0), (5, 0))
            Line((5, 0), (5, -FILLET3_R))
        make_face()
    fillet3_piece_4 = revolve(axis=Axis((-2.886751346, 4, 5), (0, -1, 0)), revolution_arc=145.959010994, mode=Mode.PRIVATE)
    fillet3_piece_4 = split(fillet3_piece_4, bisect_by=Plane(origin=(-5.630892878, 5.02758487, 10.247007444), z_dir=(0.8660254037844386, 0, -0.5000000000000001)), keep=Keep.TOP, mode=Mode.PRIVATE)
    add(fillet3_piece_4)
    with BuildSketch(Plane(origin=(-2.886751346, 4, 5), x_dir=(0, 0, 1), z_dir=(1, 0, 0))) as fillet3_piece_5_section:
        with BuildLine():
            CenterArc((5 + FILLET3_R, -FILLET3_R), FILLET3_R, 90, 90)
            Line((5 + FILLET3_R, 0), (5, 0))
            Line((5, 0), (5, -FILLET3_R))
        make_face()
    fillet3_piece_5 = revolve(axis=Axis((-2.886751346, 4, 5), (0, -1, 0)), revolution_arc=145.959010994, mode=Mode.PRIVATE)
    fillet3_piece_5 = split(fillet3_piece_5, bisect_by=Plane(origin=(-6.175606901, 4.19078831, 10.696464921), z_dir=(0.8660254037844387, 0, 0.49999999999999994)), keep=Keep.TOP, mode=Mode.PRIVATE)
    add(fillet3_piece_5)
    with BuildSketch(Plane(origin=(-5.773502692, 4, 0), x_dir=(-0.8660254037844387, 0, -0.49999999999999967), z_dir=(0.49999999999999967, 0, -0.8660254037844387))) as fillet3_piece_6_section:
        with BuildLine():
            CenterArc((5 + FILLET3_R, FILLET3_R), FILLET3_R, 180, 90)
            Line((5 + FILLET3_R, 0), (5, 0))
            Line((5, 0), (5, FILLET3_R))
        make_face()
    fillet3_piece_6 = revolve(axis=Axis((-5.773502692, 4, 0), (0, 1, 0)), revolution_arc=145.959010994, mode=Mode.PRIVATE)
    fillet3_piece_6 = split(fillet3_piece_6, bisect_by=Plane(origin=(-11.689615196, 5.027584856, -0.247007441), z_dir=(0.8660254037844386, 0, -0.5000000000000001)), keep=Keep.TOP, mode=Mode.PRIVATE)
    add(fillet3_piece_6)
    with BuildSketch(Plane(origin=(-5.773502692, 4, 0), x_dir=(-0.8660254037844387, 0, -0.49999999999999967), z_dir=(0.49999999999999967, 0, -0.8660254037844387))) as fillet3_piece_7_section:
        with BuildLine():
            CenterArc((5 + FILLET3_R, FILLET3_R), FILLET3_R, 180, 90)
            Line((5 + FILLET3_R, 0), (5, 0))
            Line((5, 0), (5, FILLET3_R))
        make_face()
    fillet3_piece_7 = revolve(axis=Axis((-5.773502692, 4, 0), (0, 1, 0)), revolution_arc=145.959010994, mode=Mode.PRIVATE)
    fillet3_piece_7 = split(fillet3_piece_7, bisect_by=Plane(origin=(-12.351213809, 4.190788344, 0), z_dir=(0, 0, -1)), keep=Keep.TOP, mode=Mode.PRIVATE)
    add(fillet3_piece_7)
    with BuildSketch(Plane(origin=(-2.886751346, 4, -5), x_dir=(-0.8660254037844389, 0, -0.49999999999999944), z_dir=(-0.49999999999999944, 0, 0.8660254037844389))) as fillet3_piece_8_section:
        with BuildLine():
            CenterArc((5 + FILLET3_R, -FILLET3_R), FILLET3_R, 90, 90)
            Line((5 + FILLET3_R, 0), (5, 0))
            Line((5, 0), (5, -FILLET3_R))
        make_face()
    fillet3_piece_8 = revolve(axis=Axis((-2.886751346, 4, -5), (0, -1, 0)), revolution_arc=145.959010994, mode=Mode.PRIVATE)
    fillet3_piece_8 = split(fillet3_piece_8, bisect_by=Plane(origin=(-6.05872232, 5.02758487, -10), z_dir=(0, 0, 1)), keep=Keep.TOP, mode=Mode.PRIVATE)
    add(fillet3_piece_8)
    with BuildSketch(Plane(origin=(-2.886751346, 4, -5), x_dir=(-0.8660254037844389, 0, -0.49999999999999944), z_dir=(-0.49999999999999944, 0, 0.8660254037844389))) as fillet3_piece_9_section:
        with BuildLine():
            CenterArc((5 + FILLET3_R, -FILLET3_R), FILLET3_R, 90, 90)
            Line((5 + FILLET3_R, 0), (5, 0))
            Line((5, 0), (5, -FILLET3_R))
        make_face()
    fillet3_piece_9 = revolve(axis=Axis((-2.886751346, 4, -5), (0, -1, 0)), revolution_arc=145.959010994, mode=Mode.PRIVATE)
    fillet3_piece_9 = split(fillet3_piece_9, bisect_by=Plane(origin=(-6.175606901, 4.19078831, -10.696464921), z_dir=(-0.8660254037844384, 0, 0.5000000000000006)), keep=Keep.TOP, mode=Mode.PRIVATE)
    add(fillet3_piece_9)
    with BuildSketch(Plane(origin=(5.773502692, 4, 0), x_dir=(0.8660254037844387, 0, -0.5), z_dir=(-0.5, 0, -0.8660254037844387))) as fillet3_piece_10_section:
        with BuildLine():
            CenterArc((5 + FILLET3_R, -FILLET3_R), FILLET3_R, 90, 90)
            Line((5 + FILLET3_R, 0), (5, 0))
            Line((5, 0), (5, -FILLET3_R))
        make_face()
    fillet3_piece_10 = revolve(axis=Axis((5.773502692, 4, 0), (0, -1, 0)), revolution_arc=145.959010994, mode=Mode.PRIVATE)
    fillet3_piece_10 = split(fillet3_piece_10, bisect_by=Plane(origin=(11.689615789, 5.027589468, -0.247008468), z_dir=(-0.8660254037844389, 0, -0.4999999999999996)), keep=Keep.TOP, mode=Mode.PRIVATE)
    add(fillet3_piece_10)
    with BuildSketch(Plane(origin=(5.773502692, 4, 0), x_dir=(0.8660254037844387, 0, -0.5), z_dir=(-0.5, 0, -0.8660254037844387))) as fillet3_piece_11_section:
        with BuildLine():
            CenterArc((5 + FILLET3_R, -FILLET3_R), FILLET3_R, 90, 90)
            Line((5 + FILLET3_R, 0), (5, 0))
            Line((5, 0), (5, -FILLET3_R))
        make_face()
    fillet3_piece_11 = revolve(axis=Axis((5.773502692, 4, 0), (0, -1, 0)), revolution_arc=145.959010994, mode=Mode.PRIVATE)
    fillet3_piece_11 = split(fillet3_piece_11, bisect_by=Plane(origin=(12.351213805, 4.190788313, 0), z_dir=(0, 0, -1)), keep=Keep.TOP, mode=Mode.PRIVATE)
    add(fillet3_piece_11)
    with BuildSketch(Plane(origin=(2.886751346, 4, -5), x_dir=(0.8660254037844386, 0, -0.5000000000000002), z_dir=(0.5000000000000002, 0, 0.8660254037844386))) as fillet3_piece_12_section:
        with BuildLine():
            CenterArc((5 + FILLET3_R, FILLET3_R), FILLET3_R, 180, 90)
            Line((5 + FILLET3_R, 0), (5, 0))
            Line((5, 0), (5, FILLET3_R))
        make_face()
    fillet3_piece_12 = revolve(axis=Axis((2.886751346, 4, -5), (0, 1, 0)), revolution_arc=145.959010994, mode=Mode.PRIVATE)
    fillet3_piece_12 = split(fillet3_piece_12, bisect_by=Plane(origin=(6.058722307, 5.027584869, -10), z_dir=(0, 0, 1)), keep=Keep.TOP, mode=Mode.PRIVATE)
    add(fillet3_piece_12)
    with BuildSketch(Plane(origin=(2.886751346, 4, -5), x_dir=(0.8660254037844386, 0, -0.5000000000000002), z_dir=(0.5000000000000002, 0, 0.8660254037844386))) as fillet3_piece_13_section:
        with BuildLine():
            CenterArc((5 + FILLET3_R, FILLET3_R), FILLET3_R, 180, 90)
            Line((5 + FILLET3_R, 0), (5, 0))
            Line((5, 0), (5, FILLET3_R))
        make_face()
    fillet3_piece_13 = revolve(axis=Axis((2.886751346, 4, -5), (0, 1, 0)), revolution_arc=145.959010994, mode=Mode.PRIVATE)
    fillet3_piece_13 = split(fillet3_piece_13, bisect_by=Plane(origin=(6.175606895, 4.190788352, -10.69646491), z_dir=(0.8660254037844387, 0, 0.49999999999999994)), keep=Keep.TOP, mode=Mode.PRIVATE)
    add(fillet3_piece_13)


solid = part.part
